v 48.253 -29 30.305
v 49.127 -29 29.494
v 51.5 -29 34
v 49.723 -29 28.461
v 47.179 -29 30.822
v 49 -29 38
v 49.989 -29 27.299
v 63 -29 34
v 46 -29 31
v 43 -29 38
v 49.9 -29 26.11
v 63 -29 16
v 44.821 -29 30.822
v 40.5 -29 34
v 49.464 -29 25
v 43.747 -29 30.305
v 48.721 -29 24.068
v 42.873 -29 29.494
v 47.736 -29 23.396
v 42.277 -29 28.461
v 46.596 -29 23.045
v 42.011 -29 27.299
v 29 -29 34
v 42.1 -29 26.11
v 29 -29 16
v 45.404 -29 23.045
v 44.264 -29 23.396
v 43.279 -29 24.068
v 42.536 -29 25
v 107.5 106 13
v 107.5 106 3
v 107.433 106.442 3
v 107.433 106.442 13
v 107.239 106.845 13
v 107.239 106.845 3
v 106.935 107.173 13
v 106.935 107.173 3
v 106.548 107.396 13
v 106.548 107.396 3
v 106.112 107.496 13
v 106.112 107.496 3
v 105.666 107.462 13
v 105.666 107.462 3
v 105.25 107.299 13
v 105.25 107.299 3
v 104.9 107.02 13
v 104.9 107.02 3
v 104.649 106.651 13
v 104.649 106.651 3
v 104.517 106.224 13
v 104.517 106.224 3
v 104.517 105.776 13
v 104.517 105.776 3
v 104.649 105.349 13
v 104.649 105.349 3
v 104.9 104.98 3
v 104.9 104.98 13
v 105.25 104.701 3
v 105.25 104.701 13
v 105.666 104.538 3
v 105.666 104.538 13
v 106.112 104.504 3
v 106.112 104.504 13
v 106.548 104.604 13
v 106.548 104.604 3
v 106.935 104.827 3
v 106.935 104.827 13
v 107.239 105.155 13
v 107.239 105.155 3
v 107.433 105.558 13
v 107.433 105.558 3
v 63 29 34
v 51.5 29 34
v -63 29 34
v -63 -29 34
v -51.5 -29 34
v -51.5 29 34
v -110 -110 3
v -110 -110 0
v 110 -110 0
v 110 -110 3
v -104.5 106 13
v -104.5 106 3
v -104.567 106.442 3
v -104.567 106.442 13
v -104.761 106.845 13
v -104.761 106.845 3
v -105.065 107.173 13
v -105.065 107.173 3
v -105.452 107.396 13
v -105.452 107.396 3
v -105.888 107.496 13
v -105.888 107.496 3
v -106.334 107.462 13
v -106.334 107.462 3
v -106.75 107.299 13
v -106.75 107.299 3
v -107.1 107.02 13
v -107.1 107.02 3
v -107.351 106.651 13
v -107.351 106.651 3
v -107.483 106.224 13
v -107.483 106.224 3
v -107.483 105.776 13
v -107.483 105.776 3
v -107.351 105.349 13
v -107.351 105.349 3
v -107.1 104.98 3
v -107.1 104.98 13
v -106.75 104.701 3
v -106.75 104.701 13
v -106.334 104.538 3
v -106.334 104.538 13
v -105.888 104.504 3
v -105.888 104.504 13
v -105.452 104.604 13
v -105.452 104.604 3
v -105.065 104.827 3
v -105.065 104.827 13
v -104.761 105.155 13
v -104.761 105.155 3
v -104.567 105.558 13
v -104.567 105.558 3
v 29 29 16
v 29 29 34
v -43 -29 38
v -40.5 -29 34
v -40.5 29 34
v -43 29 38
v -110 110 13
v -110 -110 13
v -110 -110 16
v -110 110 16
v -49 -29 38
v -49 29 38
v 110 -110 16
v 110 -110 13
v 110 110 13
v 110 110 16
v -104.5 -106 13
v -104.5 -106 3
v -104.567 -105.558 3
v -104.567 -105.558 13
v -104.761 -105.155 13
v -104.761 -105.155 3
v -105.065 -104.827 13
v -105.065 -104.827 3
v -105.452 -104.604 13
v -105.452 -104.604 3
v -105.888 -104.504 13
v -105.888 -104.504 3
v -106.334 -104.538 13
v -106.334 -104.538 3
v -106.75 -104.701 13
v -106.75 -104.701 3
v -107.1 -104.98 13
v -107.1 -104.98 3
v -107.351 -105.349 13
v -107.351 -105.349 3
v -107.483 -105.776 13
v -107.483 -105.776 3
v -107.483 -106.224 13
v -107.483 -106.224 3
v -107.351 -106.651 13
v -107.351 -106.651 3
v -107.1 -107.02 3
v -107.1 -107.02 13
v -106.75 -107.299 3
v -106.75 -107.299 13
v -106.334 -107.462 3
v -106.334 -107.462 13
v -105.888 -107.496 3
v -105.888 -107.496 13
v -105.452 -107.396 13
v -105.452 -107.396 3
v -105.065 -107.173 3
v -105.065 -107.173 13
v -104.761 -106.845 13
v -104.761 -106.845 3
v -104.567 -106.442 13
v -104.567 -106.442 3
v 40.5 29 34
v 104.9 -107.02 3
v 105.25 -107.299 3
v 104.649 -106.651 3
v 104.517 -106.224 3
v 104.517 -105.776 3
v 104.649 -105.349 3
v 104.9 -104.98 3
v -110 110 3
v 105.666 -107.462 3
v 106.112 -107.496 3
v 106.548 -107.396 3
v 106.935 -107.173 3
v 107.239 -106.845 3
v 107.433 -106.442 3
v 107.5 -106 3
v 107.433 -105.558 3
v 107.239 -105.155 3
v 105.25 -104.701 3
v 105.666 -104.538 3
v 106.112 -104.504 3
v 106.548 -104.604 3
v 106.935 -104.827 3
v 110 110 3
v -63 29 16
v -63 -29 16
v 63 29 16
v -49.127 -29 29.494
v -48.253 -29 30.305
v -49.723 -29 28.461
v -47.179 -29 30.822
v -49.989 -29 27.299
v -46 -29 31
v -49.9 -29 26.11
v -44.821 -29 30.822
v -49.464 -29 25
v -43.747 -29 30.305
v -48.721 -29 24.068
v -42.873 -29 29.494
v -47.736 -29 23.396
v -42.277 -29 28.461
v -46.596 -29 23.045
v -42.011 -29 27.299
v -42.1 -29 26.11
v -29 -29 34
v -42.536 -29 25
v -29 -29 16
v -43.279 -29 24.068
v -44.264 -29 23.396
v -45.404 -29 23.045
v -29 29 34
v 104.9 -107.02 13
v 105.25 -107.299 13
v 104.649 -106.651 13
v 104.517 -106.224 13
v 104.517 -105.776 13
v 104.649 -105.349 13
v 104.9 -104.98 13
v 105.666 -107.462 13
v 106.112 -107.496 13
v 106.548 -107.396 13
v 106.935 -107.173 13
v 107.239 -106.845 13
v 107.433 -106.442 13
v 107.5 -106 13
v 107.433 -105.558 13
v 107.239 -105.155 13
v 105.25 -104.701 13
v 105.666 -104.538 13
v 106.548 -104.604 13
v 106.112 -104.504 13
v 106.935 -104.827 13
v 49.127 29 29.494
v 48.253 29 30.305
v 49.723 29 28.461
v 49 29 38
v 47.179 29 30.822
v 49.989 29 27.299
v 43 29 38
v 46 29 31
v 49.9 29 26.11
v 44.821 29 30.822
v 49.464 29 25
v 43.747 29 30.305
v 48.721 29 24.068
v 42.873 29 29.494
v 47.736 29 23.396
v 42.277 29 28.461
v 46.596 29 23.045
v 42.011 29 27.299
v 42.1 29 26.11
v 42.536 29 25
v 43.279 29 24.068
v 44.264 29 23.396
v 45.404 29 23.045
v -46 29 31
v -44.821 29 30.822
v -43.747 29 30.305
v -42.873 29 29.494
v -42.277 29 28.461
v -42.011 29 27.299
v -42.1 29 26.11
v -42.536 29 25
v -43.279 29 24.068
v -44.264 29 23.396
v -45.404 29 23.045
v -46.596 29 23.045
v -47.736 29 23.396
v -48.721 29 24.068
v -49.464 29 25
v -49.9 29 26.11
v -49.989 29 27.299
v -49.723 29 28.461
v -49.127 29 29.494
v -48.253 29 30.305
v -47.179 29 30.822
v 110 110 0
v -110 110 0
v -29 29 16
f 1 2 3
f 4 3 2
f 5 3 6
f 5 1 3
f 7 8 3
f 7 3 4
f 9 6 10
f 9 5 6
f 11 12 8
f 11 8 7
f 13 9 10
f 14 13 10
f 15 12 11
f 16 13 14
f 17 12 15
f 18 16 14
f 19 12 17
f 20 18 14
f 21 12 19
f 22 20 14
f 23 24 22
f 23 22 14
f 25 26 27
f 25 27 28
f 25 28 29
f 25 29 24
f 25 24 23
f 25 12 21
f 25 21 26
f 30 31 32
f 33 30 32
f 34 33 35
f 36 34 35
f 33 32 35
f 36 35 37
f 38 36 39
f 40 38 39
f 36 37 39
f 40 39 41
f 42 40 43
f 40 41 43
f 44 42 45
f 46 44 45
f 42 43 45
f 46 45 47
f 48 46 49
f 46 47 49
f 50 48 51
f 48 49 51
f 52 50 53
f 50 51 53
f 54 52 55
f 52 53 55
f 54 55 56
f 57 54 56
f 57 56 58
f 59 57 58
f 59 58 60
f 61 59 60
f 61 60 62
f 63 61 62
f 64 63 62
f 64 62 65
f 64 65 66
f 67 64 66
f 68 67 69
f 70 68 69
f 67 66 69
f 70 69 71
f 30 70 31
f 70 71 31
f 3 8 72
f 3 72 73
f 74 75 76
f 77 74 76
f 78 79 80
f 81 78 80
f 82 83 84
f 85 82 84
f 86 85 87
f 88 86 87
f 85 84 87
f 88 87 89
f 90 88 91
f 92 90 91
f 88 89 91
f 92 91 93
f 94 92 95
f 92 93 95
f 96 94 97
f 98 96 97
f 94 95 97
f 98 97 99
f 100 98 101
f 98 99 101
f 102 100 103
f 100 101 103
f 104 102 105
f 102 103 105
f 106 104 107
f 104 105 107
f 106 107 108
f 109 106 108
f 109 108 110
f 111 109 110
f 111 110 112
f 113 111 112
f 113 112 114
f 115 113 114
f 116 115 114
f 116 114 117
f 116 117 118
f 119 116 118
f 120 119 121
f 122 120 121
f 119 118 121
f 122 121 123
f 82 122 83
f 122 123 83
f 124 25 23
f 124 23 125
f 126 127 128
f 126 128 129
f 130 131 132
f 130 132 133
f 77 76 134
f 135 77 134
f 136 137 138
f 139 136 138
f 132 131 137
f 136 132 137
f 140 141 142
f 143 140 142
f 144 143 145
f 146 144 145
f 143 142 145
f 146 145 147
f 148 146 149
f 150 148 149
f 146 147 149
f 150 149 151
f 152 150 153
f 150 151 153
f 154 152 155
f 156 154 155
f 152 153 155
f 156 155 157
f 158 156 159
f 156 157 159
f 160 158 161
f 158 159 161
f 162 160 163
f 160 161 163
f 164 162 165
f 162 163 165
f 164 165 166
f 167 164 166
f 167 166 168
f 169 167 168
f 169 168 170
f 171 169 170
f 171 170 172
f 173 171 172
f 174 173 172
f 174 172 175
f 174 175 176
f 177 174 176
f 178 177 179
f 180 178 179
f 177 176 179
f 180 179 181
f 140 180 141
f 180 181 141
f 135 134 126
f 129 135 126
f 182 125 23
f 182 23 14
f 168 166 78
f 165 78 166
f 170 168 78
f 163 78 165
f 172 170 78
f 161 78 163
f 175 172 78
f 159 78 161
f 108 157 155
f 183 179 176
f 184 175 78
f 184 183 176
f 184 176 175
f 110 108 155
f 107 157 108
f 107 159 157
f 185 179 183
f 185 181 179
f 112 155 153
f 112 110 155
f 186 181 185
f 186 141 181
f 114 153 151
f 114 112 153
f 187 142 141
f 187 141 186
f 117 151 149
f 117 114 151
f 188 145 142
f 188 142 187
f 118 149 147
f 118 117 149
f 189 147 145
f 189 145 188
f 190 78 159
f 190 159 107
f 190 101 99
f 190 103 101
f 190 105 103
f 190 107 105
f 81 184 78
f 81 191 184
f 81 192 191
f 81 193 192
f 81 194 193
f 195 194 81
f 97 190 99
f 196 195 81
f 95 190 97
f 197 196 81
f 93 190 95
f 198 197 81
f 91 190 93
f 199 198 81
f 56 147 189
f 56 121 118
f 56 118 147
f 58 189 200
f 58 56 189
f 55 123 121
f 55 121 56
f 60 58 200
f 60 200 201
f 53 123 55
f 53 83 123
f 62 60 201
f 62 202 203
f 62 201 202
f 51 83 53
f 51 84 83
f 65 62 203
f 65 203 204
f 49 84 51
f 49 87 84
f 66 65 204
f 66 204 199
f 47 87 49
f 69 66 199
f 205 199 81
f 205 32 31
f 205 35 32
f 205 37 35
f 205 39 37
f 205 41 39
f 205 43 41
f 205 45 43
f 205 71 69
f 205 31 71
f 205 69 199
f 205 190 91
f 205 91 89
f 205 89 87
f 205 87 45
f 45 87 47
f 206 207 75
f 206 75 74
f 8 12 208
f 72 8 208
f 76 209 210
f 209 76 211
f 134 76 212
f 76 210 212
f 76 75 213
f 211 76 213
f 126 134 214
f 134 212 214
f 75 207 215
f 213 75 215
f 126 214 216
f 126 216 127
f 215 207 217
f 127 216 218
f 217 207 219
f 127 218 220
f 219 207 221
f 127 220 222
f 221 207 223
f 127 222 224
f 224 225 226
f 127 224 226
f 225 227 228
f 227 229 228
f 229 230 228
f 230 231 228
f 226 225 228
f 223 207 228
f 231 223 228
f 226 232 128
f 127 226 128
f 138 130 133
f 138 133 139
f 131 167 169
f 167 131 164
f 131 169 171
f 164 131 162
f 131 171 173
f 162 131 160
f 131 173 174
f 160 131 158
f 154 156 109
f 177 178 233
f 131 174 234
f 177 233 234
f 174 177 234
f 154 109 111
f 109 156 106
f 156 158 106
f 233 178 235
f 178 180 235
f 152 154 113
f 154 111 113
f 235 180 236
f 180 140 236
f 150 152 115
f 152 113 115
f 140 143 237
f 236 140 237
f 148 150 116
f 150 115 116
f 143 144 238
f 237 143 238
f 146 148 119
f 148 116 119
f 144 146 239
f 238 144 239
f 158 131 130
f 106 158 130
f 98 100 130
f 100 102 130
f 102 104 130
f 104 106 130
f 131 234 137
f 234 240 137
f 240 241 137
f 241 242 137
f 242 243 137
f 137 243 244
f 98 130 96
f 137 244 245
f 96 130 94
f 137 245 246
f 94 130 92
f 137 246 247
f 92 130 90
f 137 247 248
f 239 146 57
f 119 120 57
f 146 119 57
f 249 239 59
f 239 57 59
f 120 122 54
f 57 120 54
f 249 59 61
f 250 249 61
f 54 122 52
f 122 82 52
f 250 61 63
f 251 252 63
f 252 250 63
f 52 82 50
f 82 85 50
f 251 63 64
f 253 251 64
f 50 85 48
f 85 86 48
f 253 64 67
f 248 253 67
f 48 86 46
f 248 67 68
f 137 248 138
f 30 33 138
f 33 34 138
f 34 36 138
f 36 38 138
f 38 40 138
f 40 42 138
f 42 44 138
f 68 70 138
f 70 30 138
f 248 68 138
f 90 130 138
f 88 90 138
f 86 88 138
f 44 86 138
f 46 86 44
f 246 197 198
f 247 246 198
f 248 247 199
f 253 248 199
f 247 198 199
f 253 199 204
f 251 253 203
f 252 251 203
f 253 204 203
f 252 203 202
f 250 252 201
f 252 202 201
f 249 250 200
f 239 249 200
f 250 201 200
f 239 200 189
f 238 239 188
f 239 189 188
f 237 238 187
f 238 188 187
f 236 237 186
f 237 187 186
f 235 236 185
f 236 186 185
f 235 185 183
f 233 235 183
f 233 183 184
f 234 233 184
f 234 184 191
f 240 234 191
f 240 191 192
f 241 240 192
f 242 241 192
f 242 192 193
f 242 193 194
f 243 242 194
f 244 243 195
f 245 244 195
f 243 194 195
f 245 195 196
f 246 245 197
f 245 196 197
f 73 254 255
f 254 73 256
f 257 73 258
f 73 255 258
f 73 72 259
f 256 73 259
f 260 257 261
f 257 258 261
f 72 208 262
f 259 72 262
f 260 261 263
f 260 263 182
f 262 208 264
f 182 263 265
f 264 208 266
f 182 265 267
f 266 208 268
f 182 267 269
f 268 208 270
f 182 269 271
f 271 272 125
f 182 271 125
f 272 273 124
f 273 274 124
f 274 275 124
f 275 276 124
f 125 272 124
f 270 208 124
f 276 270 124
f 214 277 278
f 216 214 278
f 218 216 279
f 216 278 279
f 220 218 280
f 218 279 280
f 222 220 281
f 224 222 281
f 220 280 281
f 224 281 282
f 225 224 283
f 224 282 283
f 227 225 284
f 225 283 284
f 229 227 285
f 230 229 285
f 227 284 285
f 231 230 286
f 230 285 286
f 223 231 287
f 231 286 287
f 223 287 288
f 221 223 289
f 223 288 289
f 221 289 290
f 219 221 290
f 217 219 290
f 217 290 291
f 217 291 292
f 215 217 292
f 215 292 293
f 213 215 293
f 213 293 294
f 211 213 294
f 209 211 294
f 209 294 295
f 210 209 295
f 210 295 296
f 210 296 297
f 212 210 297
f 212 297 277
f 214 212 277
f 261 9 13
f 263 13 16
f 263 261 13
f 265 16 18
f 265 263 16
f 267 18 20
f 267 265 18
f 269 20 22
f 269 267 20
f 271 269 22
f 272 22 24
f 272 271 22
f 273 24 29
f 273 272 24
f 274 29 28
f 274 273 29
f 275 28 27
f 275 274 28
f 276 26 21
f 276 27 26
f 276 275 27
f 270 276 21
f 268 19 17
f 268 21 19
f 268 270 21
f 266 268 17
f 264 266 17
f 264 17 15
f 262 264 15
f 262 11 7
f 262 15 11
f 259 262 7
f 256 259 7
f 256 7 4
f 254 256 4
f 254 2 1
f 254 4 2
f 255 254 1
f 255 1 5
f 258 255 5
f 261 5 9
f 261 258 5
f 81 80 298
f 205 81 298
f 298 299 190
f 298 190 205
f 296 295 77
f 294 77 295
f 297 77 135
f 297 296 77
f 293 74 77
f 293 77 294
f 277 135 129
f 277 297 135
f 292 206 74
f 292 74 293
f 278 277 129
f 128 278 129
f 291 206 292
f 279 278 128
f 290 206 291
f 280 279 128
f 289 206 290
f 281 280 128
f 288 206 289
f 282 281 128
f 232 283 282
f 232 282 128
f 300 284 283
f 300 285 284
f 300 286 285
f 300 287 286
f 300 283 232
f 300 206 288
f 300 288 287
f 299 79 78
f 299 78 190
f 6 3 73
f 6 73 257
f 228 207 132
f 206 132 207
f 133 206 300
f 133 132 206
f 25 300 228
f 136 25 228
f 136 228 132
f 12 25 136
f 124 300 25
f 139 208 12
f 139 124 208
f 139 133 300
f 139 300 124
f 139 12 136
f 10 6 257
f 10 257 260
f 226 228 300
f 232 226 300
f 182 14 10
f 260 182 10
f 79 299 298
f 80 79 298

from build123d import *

# Parameters (mm, degrees)
SKETCH_1_W          = 220
SKETCH_1_H          = 220
EXTRUDE_1_DEPTH     = 3
SKETCH_2_R          = 1.5
EXTRUDE_2_DEPTH     = 10
SKETCH_3_W          = 220
SKETCH_3_H          = 220
EXTRUDE_3_DEPTH     = 3
SKETCH_4_W          = 34
SKETCH_4_H          = 58
EXTRUDE_4_DEPTH     = 22
SKETCH_5_R          = 4
CUT_EXTRUDE_1_DEPTH = 182.287065176


with BuildPart() as part:
    # 草圖1 → 填料-伸長1 (new body)
    with BuildSketch(Plane.XY):
        Rectangle(SKETCH_1_W, SKETCH_1_H)
    extrude(amount=EXTRUDE_1_DEPTH)

    # 草圖2 → 填料-伸長2 (add)
    with BuildSketch(Plane.XY.offset(3)):
        with Locations((-106, 106)):
            Circle(SKETCH_2_R)
        with Locations((106, 106)):
            Circle(SKETCH_2_R)
        with Locations((106, -106)):
            Circle(SKETCH_2_R)
        with Locations((-106, -106)):
            Circle(SKETCH_2_R)
    extrude(amount=EXTRUDE_2_DEPTH)

    # 草圖3 → 填料-伸長3 (add)
    with BuildSketch(Plane.XY.offset(13)):
        Rectangle(SKETCH_3_W, SKETCH_3_H)
    extrude(amount=EXTRUDE_3_DEPTH)

    # 草圖4 → 填料-伸長4 (add)
    with BuildSketch(Plane.XY.offset(16)):
        with Locations((-46, 0)):
            Rectangle(SKETCH_4_W, SKETCH_4_H)
    extrude_4 = extrude(amount=EXTRUDE_4_DEPTH)

    # 草圖5 → 除料-伸長1 (cut, symmetric)
    with BuildSketch(Plane(origin=(0, 29, 0), x_dir=(1, 0, 0), z_dir=(0, 1, 0))):
        with Locations(Location((-46, -27, 0), (0, 0, 270))):
            Circle(SKETCH_5_R)
        Polygon((-63, -34), (-51.5, -34), (-49, -38), (-63, -38), align=None)
        Polygon((-29, -38), (-29, -34), (-40.5, -34), (-43, -38), align=None)
    cut_extrude_1 = extrude(amount=CUT_EXTRUDE_1_DEPTH, both=True, mode=Mode.SUBTRACT)

    # 鏡射1: 填料-伸長4, 除料-伸長1 across plane
    add(extrude_4.mirror(Plane(origin=(0, 0, 0), x_dir=(0, 0, 1), z_dir=(1, 0, 0))))
    add(cut_extrude_1.mirror(Plane(origin=(0, 0, 0), x_dir=(0, 0, 1), z_dir=(1, 0, 0))), mode=Mode.SUBTRACT)


solid = part.part
